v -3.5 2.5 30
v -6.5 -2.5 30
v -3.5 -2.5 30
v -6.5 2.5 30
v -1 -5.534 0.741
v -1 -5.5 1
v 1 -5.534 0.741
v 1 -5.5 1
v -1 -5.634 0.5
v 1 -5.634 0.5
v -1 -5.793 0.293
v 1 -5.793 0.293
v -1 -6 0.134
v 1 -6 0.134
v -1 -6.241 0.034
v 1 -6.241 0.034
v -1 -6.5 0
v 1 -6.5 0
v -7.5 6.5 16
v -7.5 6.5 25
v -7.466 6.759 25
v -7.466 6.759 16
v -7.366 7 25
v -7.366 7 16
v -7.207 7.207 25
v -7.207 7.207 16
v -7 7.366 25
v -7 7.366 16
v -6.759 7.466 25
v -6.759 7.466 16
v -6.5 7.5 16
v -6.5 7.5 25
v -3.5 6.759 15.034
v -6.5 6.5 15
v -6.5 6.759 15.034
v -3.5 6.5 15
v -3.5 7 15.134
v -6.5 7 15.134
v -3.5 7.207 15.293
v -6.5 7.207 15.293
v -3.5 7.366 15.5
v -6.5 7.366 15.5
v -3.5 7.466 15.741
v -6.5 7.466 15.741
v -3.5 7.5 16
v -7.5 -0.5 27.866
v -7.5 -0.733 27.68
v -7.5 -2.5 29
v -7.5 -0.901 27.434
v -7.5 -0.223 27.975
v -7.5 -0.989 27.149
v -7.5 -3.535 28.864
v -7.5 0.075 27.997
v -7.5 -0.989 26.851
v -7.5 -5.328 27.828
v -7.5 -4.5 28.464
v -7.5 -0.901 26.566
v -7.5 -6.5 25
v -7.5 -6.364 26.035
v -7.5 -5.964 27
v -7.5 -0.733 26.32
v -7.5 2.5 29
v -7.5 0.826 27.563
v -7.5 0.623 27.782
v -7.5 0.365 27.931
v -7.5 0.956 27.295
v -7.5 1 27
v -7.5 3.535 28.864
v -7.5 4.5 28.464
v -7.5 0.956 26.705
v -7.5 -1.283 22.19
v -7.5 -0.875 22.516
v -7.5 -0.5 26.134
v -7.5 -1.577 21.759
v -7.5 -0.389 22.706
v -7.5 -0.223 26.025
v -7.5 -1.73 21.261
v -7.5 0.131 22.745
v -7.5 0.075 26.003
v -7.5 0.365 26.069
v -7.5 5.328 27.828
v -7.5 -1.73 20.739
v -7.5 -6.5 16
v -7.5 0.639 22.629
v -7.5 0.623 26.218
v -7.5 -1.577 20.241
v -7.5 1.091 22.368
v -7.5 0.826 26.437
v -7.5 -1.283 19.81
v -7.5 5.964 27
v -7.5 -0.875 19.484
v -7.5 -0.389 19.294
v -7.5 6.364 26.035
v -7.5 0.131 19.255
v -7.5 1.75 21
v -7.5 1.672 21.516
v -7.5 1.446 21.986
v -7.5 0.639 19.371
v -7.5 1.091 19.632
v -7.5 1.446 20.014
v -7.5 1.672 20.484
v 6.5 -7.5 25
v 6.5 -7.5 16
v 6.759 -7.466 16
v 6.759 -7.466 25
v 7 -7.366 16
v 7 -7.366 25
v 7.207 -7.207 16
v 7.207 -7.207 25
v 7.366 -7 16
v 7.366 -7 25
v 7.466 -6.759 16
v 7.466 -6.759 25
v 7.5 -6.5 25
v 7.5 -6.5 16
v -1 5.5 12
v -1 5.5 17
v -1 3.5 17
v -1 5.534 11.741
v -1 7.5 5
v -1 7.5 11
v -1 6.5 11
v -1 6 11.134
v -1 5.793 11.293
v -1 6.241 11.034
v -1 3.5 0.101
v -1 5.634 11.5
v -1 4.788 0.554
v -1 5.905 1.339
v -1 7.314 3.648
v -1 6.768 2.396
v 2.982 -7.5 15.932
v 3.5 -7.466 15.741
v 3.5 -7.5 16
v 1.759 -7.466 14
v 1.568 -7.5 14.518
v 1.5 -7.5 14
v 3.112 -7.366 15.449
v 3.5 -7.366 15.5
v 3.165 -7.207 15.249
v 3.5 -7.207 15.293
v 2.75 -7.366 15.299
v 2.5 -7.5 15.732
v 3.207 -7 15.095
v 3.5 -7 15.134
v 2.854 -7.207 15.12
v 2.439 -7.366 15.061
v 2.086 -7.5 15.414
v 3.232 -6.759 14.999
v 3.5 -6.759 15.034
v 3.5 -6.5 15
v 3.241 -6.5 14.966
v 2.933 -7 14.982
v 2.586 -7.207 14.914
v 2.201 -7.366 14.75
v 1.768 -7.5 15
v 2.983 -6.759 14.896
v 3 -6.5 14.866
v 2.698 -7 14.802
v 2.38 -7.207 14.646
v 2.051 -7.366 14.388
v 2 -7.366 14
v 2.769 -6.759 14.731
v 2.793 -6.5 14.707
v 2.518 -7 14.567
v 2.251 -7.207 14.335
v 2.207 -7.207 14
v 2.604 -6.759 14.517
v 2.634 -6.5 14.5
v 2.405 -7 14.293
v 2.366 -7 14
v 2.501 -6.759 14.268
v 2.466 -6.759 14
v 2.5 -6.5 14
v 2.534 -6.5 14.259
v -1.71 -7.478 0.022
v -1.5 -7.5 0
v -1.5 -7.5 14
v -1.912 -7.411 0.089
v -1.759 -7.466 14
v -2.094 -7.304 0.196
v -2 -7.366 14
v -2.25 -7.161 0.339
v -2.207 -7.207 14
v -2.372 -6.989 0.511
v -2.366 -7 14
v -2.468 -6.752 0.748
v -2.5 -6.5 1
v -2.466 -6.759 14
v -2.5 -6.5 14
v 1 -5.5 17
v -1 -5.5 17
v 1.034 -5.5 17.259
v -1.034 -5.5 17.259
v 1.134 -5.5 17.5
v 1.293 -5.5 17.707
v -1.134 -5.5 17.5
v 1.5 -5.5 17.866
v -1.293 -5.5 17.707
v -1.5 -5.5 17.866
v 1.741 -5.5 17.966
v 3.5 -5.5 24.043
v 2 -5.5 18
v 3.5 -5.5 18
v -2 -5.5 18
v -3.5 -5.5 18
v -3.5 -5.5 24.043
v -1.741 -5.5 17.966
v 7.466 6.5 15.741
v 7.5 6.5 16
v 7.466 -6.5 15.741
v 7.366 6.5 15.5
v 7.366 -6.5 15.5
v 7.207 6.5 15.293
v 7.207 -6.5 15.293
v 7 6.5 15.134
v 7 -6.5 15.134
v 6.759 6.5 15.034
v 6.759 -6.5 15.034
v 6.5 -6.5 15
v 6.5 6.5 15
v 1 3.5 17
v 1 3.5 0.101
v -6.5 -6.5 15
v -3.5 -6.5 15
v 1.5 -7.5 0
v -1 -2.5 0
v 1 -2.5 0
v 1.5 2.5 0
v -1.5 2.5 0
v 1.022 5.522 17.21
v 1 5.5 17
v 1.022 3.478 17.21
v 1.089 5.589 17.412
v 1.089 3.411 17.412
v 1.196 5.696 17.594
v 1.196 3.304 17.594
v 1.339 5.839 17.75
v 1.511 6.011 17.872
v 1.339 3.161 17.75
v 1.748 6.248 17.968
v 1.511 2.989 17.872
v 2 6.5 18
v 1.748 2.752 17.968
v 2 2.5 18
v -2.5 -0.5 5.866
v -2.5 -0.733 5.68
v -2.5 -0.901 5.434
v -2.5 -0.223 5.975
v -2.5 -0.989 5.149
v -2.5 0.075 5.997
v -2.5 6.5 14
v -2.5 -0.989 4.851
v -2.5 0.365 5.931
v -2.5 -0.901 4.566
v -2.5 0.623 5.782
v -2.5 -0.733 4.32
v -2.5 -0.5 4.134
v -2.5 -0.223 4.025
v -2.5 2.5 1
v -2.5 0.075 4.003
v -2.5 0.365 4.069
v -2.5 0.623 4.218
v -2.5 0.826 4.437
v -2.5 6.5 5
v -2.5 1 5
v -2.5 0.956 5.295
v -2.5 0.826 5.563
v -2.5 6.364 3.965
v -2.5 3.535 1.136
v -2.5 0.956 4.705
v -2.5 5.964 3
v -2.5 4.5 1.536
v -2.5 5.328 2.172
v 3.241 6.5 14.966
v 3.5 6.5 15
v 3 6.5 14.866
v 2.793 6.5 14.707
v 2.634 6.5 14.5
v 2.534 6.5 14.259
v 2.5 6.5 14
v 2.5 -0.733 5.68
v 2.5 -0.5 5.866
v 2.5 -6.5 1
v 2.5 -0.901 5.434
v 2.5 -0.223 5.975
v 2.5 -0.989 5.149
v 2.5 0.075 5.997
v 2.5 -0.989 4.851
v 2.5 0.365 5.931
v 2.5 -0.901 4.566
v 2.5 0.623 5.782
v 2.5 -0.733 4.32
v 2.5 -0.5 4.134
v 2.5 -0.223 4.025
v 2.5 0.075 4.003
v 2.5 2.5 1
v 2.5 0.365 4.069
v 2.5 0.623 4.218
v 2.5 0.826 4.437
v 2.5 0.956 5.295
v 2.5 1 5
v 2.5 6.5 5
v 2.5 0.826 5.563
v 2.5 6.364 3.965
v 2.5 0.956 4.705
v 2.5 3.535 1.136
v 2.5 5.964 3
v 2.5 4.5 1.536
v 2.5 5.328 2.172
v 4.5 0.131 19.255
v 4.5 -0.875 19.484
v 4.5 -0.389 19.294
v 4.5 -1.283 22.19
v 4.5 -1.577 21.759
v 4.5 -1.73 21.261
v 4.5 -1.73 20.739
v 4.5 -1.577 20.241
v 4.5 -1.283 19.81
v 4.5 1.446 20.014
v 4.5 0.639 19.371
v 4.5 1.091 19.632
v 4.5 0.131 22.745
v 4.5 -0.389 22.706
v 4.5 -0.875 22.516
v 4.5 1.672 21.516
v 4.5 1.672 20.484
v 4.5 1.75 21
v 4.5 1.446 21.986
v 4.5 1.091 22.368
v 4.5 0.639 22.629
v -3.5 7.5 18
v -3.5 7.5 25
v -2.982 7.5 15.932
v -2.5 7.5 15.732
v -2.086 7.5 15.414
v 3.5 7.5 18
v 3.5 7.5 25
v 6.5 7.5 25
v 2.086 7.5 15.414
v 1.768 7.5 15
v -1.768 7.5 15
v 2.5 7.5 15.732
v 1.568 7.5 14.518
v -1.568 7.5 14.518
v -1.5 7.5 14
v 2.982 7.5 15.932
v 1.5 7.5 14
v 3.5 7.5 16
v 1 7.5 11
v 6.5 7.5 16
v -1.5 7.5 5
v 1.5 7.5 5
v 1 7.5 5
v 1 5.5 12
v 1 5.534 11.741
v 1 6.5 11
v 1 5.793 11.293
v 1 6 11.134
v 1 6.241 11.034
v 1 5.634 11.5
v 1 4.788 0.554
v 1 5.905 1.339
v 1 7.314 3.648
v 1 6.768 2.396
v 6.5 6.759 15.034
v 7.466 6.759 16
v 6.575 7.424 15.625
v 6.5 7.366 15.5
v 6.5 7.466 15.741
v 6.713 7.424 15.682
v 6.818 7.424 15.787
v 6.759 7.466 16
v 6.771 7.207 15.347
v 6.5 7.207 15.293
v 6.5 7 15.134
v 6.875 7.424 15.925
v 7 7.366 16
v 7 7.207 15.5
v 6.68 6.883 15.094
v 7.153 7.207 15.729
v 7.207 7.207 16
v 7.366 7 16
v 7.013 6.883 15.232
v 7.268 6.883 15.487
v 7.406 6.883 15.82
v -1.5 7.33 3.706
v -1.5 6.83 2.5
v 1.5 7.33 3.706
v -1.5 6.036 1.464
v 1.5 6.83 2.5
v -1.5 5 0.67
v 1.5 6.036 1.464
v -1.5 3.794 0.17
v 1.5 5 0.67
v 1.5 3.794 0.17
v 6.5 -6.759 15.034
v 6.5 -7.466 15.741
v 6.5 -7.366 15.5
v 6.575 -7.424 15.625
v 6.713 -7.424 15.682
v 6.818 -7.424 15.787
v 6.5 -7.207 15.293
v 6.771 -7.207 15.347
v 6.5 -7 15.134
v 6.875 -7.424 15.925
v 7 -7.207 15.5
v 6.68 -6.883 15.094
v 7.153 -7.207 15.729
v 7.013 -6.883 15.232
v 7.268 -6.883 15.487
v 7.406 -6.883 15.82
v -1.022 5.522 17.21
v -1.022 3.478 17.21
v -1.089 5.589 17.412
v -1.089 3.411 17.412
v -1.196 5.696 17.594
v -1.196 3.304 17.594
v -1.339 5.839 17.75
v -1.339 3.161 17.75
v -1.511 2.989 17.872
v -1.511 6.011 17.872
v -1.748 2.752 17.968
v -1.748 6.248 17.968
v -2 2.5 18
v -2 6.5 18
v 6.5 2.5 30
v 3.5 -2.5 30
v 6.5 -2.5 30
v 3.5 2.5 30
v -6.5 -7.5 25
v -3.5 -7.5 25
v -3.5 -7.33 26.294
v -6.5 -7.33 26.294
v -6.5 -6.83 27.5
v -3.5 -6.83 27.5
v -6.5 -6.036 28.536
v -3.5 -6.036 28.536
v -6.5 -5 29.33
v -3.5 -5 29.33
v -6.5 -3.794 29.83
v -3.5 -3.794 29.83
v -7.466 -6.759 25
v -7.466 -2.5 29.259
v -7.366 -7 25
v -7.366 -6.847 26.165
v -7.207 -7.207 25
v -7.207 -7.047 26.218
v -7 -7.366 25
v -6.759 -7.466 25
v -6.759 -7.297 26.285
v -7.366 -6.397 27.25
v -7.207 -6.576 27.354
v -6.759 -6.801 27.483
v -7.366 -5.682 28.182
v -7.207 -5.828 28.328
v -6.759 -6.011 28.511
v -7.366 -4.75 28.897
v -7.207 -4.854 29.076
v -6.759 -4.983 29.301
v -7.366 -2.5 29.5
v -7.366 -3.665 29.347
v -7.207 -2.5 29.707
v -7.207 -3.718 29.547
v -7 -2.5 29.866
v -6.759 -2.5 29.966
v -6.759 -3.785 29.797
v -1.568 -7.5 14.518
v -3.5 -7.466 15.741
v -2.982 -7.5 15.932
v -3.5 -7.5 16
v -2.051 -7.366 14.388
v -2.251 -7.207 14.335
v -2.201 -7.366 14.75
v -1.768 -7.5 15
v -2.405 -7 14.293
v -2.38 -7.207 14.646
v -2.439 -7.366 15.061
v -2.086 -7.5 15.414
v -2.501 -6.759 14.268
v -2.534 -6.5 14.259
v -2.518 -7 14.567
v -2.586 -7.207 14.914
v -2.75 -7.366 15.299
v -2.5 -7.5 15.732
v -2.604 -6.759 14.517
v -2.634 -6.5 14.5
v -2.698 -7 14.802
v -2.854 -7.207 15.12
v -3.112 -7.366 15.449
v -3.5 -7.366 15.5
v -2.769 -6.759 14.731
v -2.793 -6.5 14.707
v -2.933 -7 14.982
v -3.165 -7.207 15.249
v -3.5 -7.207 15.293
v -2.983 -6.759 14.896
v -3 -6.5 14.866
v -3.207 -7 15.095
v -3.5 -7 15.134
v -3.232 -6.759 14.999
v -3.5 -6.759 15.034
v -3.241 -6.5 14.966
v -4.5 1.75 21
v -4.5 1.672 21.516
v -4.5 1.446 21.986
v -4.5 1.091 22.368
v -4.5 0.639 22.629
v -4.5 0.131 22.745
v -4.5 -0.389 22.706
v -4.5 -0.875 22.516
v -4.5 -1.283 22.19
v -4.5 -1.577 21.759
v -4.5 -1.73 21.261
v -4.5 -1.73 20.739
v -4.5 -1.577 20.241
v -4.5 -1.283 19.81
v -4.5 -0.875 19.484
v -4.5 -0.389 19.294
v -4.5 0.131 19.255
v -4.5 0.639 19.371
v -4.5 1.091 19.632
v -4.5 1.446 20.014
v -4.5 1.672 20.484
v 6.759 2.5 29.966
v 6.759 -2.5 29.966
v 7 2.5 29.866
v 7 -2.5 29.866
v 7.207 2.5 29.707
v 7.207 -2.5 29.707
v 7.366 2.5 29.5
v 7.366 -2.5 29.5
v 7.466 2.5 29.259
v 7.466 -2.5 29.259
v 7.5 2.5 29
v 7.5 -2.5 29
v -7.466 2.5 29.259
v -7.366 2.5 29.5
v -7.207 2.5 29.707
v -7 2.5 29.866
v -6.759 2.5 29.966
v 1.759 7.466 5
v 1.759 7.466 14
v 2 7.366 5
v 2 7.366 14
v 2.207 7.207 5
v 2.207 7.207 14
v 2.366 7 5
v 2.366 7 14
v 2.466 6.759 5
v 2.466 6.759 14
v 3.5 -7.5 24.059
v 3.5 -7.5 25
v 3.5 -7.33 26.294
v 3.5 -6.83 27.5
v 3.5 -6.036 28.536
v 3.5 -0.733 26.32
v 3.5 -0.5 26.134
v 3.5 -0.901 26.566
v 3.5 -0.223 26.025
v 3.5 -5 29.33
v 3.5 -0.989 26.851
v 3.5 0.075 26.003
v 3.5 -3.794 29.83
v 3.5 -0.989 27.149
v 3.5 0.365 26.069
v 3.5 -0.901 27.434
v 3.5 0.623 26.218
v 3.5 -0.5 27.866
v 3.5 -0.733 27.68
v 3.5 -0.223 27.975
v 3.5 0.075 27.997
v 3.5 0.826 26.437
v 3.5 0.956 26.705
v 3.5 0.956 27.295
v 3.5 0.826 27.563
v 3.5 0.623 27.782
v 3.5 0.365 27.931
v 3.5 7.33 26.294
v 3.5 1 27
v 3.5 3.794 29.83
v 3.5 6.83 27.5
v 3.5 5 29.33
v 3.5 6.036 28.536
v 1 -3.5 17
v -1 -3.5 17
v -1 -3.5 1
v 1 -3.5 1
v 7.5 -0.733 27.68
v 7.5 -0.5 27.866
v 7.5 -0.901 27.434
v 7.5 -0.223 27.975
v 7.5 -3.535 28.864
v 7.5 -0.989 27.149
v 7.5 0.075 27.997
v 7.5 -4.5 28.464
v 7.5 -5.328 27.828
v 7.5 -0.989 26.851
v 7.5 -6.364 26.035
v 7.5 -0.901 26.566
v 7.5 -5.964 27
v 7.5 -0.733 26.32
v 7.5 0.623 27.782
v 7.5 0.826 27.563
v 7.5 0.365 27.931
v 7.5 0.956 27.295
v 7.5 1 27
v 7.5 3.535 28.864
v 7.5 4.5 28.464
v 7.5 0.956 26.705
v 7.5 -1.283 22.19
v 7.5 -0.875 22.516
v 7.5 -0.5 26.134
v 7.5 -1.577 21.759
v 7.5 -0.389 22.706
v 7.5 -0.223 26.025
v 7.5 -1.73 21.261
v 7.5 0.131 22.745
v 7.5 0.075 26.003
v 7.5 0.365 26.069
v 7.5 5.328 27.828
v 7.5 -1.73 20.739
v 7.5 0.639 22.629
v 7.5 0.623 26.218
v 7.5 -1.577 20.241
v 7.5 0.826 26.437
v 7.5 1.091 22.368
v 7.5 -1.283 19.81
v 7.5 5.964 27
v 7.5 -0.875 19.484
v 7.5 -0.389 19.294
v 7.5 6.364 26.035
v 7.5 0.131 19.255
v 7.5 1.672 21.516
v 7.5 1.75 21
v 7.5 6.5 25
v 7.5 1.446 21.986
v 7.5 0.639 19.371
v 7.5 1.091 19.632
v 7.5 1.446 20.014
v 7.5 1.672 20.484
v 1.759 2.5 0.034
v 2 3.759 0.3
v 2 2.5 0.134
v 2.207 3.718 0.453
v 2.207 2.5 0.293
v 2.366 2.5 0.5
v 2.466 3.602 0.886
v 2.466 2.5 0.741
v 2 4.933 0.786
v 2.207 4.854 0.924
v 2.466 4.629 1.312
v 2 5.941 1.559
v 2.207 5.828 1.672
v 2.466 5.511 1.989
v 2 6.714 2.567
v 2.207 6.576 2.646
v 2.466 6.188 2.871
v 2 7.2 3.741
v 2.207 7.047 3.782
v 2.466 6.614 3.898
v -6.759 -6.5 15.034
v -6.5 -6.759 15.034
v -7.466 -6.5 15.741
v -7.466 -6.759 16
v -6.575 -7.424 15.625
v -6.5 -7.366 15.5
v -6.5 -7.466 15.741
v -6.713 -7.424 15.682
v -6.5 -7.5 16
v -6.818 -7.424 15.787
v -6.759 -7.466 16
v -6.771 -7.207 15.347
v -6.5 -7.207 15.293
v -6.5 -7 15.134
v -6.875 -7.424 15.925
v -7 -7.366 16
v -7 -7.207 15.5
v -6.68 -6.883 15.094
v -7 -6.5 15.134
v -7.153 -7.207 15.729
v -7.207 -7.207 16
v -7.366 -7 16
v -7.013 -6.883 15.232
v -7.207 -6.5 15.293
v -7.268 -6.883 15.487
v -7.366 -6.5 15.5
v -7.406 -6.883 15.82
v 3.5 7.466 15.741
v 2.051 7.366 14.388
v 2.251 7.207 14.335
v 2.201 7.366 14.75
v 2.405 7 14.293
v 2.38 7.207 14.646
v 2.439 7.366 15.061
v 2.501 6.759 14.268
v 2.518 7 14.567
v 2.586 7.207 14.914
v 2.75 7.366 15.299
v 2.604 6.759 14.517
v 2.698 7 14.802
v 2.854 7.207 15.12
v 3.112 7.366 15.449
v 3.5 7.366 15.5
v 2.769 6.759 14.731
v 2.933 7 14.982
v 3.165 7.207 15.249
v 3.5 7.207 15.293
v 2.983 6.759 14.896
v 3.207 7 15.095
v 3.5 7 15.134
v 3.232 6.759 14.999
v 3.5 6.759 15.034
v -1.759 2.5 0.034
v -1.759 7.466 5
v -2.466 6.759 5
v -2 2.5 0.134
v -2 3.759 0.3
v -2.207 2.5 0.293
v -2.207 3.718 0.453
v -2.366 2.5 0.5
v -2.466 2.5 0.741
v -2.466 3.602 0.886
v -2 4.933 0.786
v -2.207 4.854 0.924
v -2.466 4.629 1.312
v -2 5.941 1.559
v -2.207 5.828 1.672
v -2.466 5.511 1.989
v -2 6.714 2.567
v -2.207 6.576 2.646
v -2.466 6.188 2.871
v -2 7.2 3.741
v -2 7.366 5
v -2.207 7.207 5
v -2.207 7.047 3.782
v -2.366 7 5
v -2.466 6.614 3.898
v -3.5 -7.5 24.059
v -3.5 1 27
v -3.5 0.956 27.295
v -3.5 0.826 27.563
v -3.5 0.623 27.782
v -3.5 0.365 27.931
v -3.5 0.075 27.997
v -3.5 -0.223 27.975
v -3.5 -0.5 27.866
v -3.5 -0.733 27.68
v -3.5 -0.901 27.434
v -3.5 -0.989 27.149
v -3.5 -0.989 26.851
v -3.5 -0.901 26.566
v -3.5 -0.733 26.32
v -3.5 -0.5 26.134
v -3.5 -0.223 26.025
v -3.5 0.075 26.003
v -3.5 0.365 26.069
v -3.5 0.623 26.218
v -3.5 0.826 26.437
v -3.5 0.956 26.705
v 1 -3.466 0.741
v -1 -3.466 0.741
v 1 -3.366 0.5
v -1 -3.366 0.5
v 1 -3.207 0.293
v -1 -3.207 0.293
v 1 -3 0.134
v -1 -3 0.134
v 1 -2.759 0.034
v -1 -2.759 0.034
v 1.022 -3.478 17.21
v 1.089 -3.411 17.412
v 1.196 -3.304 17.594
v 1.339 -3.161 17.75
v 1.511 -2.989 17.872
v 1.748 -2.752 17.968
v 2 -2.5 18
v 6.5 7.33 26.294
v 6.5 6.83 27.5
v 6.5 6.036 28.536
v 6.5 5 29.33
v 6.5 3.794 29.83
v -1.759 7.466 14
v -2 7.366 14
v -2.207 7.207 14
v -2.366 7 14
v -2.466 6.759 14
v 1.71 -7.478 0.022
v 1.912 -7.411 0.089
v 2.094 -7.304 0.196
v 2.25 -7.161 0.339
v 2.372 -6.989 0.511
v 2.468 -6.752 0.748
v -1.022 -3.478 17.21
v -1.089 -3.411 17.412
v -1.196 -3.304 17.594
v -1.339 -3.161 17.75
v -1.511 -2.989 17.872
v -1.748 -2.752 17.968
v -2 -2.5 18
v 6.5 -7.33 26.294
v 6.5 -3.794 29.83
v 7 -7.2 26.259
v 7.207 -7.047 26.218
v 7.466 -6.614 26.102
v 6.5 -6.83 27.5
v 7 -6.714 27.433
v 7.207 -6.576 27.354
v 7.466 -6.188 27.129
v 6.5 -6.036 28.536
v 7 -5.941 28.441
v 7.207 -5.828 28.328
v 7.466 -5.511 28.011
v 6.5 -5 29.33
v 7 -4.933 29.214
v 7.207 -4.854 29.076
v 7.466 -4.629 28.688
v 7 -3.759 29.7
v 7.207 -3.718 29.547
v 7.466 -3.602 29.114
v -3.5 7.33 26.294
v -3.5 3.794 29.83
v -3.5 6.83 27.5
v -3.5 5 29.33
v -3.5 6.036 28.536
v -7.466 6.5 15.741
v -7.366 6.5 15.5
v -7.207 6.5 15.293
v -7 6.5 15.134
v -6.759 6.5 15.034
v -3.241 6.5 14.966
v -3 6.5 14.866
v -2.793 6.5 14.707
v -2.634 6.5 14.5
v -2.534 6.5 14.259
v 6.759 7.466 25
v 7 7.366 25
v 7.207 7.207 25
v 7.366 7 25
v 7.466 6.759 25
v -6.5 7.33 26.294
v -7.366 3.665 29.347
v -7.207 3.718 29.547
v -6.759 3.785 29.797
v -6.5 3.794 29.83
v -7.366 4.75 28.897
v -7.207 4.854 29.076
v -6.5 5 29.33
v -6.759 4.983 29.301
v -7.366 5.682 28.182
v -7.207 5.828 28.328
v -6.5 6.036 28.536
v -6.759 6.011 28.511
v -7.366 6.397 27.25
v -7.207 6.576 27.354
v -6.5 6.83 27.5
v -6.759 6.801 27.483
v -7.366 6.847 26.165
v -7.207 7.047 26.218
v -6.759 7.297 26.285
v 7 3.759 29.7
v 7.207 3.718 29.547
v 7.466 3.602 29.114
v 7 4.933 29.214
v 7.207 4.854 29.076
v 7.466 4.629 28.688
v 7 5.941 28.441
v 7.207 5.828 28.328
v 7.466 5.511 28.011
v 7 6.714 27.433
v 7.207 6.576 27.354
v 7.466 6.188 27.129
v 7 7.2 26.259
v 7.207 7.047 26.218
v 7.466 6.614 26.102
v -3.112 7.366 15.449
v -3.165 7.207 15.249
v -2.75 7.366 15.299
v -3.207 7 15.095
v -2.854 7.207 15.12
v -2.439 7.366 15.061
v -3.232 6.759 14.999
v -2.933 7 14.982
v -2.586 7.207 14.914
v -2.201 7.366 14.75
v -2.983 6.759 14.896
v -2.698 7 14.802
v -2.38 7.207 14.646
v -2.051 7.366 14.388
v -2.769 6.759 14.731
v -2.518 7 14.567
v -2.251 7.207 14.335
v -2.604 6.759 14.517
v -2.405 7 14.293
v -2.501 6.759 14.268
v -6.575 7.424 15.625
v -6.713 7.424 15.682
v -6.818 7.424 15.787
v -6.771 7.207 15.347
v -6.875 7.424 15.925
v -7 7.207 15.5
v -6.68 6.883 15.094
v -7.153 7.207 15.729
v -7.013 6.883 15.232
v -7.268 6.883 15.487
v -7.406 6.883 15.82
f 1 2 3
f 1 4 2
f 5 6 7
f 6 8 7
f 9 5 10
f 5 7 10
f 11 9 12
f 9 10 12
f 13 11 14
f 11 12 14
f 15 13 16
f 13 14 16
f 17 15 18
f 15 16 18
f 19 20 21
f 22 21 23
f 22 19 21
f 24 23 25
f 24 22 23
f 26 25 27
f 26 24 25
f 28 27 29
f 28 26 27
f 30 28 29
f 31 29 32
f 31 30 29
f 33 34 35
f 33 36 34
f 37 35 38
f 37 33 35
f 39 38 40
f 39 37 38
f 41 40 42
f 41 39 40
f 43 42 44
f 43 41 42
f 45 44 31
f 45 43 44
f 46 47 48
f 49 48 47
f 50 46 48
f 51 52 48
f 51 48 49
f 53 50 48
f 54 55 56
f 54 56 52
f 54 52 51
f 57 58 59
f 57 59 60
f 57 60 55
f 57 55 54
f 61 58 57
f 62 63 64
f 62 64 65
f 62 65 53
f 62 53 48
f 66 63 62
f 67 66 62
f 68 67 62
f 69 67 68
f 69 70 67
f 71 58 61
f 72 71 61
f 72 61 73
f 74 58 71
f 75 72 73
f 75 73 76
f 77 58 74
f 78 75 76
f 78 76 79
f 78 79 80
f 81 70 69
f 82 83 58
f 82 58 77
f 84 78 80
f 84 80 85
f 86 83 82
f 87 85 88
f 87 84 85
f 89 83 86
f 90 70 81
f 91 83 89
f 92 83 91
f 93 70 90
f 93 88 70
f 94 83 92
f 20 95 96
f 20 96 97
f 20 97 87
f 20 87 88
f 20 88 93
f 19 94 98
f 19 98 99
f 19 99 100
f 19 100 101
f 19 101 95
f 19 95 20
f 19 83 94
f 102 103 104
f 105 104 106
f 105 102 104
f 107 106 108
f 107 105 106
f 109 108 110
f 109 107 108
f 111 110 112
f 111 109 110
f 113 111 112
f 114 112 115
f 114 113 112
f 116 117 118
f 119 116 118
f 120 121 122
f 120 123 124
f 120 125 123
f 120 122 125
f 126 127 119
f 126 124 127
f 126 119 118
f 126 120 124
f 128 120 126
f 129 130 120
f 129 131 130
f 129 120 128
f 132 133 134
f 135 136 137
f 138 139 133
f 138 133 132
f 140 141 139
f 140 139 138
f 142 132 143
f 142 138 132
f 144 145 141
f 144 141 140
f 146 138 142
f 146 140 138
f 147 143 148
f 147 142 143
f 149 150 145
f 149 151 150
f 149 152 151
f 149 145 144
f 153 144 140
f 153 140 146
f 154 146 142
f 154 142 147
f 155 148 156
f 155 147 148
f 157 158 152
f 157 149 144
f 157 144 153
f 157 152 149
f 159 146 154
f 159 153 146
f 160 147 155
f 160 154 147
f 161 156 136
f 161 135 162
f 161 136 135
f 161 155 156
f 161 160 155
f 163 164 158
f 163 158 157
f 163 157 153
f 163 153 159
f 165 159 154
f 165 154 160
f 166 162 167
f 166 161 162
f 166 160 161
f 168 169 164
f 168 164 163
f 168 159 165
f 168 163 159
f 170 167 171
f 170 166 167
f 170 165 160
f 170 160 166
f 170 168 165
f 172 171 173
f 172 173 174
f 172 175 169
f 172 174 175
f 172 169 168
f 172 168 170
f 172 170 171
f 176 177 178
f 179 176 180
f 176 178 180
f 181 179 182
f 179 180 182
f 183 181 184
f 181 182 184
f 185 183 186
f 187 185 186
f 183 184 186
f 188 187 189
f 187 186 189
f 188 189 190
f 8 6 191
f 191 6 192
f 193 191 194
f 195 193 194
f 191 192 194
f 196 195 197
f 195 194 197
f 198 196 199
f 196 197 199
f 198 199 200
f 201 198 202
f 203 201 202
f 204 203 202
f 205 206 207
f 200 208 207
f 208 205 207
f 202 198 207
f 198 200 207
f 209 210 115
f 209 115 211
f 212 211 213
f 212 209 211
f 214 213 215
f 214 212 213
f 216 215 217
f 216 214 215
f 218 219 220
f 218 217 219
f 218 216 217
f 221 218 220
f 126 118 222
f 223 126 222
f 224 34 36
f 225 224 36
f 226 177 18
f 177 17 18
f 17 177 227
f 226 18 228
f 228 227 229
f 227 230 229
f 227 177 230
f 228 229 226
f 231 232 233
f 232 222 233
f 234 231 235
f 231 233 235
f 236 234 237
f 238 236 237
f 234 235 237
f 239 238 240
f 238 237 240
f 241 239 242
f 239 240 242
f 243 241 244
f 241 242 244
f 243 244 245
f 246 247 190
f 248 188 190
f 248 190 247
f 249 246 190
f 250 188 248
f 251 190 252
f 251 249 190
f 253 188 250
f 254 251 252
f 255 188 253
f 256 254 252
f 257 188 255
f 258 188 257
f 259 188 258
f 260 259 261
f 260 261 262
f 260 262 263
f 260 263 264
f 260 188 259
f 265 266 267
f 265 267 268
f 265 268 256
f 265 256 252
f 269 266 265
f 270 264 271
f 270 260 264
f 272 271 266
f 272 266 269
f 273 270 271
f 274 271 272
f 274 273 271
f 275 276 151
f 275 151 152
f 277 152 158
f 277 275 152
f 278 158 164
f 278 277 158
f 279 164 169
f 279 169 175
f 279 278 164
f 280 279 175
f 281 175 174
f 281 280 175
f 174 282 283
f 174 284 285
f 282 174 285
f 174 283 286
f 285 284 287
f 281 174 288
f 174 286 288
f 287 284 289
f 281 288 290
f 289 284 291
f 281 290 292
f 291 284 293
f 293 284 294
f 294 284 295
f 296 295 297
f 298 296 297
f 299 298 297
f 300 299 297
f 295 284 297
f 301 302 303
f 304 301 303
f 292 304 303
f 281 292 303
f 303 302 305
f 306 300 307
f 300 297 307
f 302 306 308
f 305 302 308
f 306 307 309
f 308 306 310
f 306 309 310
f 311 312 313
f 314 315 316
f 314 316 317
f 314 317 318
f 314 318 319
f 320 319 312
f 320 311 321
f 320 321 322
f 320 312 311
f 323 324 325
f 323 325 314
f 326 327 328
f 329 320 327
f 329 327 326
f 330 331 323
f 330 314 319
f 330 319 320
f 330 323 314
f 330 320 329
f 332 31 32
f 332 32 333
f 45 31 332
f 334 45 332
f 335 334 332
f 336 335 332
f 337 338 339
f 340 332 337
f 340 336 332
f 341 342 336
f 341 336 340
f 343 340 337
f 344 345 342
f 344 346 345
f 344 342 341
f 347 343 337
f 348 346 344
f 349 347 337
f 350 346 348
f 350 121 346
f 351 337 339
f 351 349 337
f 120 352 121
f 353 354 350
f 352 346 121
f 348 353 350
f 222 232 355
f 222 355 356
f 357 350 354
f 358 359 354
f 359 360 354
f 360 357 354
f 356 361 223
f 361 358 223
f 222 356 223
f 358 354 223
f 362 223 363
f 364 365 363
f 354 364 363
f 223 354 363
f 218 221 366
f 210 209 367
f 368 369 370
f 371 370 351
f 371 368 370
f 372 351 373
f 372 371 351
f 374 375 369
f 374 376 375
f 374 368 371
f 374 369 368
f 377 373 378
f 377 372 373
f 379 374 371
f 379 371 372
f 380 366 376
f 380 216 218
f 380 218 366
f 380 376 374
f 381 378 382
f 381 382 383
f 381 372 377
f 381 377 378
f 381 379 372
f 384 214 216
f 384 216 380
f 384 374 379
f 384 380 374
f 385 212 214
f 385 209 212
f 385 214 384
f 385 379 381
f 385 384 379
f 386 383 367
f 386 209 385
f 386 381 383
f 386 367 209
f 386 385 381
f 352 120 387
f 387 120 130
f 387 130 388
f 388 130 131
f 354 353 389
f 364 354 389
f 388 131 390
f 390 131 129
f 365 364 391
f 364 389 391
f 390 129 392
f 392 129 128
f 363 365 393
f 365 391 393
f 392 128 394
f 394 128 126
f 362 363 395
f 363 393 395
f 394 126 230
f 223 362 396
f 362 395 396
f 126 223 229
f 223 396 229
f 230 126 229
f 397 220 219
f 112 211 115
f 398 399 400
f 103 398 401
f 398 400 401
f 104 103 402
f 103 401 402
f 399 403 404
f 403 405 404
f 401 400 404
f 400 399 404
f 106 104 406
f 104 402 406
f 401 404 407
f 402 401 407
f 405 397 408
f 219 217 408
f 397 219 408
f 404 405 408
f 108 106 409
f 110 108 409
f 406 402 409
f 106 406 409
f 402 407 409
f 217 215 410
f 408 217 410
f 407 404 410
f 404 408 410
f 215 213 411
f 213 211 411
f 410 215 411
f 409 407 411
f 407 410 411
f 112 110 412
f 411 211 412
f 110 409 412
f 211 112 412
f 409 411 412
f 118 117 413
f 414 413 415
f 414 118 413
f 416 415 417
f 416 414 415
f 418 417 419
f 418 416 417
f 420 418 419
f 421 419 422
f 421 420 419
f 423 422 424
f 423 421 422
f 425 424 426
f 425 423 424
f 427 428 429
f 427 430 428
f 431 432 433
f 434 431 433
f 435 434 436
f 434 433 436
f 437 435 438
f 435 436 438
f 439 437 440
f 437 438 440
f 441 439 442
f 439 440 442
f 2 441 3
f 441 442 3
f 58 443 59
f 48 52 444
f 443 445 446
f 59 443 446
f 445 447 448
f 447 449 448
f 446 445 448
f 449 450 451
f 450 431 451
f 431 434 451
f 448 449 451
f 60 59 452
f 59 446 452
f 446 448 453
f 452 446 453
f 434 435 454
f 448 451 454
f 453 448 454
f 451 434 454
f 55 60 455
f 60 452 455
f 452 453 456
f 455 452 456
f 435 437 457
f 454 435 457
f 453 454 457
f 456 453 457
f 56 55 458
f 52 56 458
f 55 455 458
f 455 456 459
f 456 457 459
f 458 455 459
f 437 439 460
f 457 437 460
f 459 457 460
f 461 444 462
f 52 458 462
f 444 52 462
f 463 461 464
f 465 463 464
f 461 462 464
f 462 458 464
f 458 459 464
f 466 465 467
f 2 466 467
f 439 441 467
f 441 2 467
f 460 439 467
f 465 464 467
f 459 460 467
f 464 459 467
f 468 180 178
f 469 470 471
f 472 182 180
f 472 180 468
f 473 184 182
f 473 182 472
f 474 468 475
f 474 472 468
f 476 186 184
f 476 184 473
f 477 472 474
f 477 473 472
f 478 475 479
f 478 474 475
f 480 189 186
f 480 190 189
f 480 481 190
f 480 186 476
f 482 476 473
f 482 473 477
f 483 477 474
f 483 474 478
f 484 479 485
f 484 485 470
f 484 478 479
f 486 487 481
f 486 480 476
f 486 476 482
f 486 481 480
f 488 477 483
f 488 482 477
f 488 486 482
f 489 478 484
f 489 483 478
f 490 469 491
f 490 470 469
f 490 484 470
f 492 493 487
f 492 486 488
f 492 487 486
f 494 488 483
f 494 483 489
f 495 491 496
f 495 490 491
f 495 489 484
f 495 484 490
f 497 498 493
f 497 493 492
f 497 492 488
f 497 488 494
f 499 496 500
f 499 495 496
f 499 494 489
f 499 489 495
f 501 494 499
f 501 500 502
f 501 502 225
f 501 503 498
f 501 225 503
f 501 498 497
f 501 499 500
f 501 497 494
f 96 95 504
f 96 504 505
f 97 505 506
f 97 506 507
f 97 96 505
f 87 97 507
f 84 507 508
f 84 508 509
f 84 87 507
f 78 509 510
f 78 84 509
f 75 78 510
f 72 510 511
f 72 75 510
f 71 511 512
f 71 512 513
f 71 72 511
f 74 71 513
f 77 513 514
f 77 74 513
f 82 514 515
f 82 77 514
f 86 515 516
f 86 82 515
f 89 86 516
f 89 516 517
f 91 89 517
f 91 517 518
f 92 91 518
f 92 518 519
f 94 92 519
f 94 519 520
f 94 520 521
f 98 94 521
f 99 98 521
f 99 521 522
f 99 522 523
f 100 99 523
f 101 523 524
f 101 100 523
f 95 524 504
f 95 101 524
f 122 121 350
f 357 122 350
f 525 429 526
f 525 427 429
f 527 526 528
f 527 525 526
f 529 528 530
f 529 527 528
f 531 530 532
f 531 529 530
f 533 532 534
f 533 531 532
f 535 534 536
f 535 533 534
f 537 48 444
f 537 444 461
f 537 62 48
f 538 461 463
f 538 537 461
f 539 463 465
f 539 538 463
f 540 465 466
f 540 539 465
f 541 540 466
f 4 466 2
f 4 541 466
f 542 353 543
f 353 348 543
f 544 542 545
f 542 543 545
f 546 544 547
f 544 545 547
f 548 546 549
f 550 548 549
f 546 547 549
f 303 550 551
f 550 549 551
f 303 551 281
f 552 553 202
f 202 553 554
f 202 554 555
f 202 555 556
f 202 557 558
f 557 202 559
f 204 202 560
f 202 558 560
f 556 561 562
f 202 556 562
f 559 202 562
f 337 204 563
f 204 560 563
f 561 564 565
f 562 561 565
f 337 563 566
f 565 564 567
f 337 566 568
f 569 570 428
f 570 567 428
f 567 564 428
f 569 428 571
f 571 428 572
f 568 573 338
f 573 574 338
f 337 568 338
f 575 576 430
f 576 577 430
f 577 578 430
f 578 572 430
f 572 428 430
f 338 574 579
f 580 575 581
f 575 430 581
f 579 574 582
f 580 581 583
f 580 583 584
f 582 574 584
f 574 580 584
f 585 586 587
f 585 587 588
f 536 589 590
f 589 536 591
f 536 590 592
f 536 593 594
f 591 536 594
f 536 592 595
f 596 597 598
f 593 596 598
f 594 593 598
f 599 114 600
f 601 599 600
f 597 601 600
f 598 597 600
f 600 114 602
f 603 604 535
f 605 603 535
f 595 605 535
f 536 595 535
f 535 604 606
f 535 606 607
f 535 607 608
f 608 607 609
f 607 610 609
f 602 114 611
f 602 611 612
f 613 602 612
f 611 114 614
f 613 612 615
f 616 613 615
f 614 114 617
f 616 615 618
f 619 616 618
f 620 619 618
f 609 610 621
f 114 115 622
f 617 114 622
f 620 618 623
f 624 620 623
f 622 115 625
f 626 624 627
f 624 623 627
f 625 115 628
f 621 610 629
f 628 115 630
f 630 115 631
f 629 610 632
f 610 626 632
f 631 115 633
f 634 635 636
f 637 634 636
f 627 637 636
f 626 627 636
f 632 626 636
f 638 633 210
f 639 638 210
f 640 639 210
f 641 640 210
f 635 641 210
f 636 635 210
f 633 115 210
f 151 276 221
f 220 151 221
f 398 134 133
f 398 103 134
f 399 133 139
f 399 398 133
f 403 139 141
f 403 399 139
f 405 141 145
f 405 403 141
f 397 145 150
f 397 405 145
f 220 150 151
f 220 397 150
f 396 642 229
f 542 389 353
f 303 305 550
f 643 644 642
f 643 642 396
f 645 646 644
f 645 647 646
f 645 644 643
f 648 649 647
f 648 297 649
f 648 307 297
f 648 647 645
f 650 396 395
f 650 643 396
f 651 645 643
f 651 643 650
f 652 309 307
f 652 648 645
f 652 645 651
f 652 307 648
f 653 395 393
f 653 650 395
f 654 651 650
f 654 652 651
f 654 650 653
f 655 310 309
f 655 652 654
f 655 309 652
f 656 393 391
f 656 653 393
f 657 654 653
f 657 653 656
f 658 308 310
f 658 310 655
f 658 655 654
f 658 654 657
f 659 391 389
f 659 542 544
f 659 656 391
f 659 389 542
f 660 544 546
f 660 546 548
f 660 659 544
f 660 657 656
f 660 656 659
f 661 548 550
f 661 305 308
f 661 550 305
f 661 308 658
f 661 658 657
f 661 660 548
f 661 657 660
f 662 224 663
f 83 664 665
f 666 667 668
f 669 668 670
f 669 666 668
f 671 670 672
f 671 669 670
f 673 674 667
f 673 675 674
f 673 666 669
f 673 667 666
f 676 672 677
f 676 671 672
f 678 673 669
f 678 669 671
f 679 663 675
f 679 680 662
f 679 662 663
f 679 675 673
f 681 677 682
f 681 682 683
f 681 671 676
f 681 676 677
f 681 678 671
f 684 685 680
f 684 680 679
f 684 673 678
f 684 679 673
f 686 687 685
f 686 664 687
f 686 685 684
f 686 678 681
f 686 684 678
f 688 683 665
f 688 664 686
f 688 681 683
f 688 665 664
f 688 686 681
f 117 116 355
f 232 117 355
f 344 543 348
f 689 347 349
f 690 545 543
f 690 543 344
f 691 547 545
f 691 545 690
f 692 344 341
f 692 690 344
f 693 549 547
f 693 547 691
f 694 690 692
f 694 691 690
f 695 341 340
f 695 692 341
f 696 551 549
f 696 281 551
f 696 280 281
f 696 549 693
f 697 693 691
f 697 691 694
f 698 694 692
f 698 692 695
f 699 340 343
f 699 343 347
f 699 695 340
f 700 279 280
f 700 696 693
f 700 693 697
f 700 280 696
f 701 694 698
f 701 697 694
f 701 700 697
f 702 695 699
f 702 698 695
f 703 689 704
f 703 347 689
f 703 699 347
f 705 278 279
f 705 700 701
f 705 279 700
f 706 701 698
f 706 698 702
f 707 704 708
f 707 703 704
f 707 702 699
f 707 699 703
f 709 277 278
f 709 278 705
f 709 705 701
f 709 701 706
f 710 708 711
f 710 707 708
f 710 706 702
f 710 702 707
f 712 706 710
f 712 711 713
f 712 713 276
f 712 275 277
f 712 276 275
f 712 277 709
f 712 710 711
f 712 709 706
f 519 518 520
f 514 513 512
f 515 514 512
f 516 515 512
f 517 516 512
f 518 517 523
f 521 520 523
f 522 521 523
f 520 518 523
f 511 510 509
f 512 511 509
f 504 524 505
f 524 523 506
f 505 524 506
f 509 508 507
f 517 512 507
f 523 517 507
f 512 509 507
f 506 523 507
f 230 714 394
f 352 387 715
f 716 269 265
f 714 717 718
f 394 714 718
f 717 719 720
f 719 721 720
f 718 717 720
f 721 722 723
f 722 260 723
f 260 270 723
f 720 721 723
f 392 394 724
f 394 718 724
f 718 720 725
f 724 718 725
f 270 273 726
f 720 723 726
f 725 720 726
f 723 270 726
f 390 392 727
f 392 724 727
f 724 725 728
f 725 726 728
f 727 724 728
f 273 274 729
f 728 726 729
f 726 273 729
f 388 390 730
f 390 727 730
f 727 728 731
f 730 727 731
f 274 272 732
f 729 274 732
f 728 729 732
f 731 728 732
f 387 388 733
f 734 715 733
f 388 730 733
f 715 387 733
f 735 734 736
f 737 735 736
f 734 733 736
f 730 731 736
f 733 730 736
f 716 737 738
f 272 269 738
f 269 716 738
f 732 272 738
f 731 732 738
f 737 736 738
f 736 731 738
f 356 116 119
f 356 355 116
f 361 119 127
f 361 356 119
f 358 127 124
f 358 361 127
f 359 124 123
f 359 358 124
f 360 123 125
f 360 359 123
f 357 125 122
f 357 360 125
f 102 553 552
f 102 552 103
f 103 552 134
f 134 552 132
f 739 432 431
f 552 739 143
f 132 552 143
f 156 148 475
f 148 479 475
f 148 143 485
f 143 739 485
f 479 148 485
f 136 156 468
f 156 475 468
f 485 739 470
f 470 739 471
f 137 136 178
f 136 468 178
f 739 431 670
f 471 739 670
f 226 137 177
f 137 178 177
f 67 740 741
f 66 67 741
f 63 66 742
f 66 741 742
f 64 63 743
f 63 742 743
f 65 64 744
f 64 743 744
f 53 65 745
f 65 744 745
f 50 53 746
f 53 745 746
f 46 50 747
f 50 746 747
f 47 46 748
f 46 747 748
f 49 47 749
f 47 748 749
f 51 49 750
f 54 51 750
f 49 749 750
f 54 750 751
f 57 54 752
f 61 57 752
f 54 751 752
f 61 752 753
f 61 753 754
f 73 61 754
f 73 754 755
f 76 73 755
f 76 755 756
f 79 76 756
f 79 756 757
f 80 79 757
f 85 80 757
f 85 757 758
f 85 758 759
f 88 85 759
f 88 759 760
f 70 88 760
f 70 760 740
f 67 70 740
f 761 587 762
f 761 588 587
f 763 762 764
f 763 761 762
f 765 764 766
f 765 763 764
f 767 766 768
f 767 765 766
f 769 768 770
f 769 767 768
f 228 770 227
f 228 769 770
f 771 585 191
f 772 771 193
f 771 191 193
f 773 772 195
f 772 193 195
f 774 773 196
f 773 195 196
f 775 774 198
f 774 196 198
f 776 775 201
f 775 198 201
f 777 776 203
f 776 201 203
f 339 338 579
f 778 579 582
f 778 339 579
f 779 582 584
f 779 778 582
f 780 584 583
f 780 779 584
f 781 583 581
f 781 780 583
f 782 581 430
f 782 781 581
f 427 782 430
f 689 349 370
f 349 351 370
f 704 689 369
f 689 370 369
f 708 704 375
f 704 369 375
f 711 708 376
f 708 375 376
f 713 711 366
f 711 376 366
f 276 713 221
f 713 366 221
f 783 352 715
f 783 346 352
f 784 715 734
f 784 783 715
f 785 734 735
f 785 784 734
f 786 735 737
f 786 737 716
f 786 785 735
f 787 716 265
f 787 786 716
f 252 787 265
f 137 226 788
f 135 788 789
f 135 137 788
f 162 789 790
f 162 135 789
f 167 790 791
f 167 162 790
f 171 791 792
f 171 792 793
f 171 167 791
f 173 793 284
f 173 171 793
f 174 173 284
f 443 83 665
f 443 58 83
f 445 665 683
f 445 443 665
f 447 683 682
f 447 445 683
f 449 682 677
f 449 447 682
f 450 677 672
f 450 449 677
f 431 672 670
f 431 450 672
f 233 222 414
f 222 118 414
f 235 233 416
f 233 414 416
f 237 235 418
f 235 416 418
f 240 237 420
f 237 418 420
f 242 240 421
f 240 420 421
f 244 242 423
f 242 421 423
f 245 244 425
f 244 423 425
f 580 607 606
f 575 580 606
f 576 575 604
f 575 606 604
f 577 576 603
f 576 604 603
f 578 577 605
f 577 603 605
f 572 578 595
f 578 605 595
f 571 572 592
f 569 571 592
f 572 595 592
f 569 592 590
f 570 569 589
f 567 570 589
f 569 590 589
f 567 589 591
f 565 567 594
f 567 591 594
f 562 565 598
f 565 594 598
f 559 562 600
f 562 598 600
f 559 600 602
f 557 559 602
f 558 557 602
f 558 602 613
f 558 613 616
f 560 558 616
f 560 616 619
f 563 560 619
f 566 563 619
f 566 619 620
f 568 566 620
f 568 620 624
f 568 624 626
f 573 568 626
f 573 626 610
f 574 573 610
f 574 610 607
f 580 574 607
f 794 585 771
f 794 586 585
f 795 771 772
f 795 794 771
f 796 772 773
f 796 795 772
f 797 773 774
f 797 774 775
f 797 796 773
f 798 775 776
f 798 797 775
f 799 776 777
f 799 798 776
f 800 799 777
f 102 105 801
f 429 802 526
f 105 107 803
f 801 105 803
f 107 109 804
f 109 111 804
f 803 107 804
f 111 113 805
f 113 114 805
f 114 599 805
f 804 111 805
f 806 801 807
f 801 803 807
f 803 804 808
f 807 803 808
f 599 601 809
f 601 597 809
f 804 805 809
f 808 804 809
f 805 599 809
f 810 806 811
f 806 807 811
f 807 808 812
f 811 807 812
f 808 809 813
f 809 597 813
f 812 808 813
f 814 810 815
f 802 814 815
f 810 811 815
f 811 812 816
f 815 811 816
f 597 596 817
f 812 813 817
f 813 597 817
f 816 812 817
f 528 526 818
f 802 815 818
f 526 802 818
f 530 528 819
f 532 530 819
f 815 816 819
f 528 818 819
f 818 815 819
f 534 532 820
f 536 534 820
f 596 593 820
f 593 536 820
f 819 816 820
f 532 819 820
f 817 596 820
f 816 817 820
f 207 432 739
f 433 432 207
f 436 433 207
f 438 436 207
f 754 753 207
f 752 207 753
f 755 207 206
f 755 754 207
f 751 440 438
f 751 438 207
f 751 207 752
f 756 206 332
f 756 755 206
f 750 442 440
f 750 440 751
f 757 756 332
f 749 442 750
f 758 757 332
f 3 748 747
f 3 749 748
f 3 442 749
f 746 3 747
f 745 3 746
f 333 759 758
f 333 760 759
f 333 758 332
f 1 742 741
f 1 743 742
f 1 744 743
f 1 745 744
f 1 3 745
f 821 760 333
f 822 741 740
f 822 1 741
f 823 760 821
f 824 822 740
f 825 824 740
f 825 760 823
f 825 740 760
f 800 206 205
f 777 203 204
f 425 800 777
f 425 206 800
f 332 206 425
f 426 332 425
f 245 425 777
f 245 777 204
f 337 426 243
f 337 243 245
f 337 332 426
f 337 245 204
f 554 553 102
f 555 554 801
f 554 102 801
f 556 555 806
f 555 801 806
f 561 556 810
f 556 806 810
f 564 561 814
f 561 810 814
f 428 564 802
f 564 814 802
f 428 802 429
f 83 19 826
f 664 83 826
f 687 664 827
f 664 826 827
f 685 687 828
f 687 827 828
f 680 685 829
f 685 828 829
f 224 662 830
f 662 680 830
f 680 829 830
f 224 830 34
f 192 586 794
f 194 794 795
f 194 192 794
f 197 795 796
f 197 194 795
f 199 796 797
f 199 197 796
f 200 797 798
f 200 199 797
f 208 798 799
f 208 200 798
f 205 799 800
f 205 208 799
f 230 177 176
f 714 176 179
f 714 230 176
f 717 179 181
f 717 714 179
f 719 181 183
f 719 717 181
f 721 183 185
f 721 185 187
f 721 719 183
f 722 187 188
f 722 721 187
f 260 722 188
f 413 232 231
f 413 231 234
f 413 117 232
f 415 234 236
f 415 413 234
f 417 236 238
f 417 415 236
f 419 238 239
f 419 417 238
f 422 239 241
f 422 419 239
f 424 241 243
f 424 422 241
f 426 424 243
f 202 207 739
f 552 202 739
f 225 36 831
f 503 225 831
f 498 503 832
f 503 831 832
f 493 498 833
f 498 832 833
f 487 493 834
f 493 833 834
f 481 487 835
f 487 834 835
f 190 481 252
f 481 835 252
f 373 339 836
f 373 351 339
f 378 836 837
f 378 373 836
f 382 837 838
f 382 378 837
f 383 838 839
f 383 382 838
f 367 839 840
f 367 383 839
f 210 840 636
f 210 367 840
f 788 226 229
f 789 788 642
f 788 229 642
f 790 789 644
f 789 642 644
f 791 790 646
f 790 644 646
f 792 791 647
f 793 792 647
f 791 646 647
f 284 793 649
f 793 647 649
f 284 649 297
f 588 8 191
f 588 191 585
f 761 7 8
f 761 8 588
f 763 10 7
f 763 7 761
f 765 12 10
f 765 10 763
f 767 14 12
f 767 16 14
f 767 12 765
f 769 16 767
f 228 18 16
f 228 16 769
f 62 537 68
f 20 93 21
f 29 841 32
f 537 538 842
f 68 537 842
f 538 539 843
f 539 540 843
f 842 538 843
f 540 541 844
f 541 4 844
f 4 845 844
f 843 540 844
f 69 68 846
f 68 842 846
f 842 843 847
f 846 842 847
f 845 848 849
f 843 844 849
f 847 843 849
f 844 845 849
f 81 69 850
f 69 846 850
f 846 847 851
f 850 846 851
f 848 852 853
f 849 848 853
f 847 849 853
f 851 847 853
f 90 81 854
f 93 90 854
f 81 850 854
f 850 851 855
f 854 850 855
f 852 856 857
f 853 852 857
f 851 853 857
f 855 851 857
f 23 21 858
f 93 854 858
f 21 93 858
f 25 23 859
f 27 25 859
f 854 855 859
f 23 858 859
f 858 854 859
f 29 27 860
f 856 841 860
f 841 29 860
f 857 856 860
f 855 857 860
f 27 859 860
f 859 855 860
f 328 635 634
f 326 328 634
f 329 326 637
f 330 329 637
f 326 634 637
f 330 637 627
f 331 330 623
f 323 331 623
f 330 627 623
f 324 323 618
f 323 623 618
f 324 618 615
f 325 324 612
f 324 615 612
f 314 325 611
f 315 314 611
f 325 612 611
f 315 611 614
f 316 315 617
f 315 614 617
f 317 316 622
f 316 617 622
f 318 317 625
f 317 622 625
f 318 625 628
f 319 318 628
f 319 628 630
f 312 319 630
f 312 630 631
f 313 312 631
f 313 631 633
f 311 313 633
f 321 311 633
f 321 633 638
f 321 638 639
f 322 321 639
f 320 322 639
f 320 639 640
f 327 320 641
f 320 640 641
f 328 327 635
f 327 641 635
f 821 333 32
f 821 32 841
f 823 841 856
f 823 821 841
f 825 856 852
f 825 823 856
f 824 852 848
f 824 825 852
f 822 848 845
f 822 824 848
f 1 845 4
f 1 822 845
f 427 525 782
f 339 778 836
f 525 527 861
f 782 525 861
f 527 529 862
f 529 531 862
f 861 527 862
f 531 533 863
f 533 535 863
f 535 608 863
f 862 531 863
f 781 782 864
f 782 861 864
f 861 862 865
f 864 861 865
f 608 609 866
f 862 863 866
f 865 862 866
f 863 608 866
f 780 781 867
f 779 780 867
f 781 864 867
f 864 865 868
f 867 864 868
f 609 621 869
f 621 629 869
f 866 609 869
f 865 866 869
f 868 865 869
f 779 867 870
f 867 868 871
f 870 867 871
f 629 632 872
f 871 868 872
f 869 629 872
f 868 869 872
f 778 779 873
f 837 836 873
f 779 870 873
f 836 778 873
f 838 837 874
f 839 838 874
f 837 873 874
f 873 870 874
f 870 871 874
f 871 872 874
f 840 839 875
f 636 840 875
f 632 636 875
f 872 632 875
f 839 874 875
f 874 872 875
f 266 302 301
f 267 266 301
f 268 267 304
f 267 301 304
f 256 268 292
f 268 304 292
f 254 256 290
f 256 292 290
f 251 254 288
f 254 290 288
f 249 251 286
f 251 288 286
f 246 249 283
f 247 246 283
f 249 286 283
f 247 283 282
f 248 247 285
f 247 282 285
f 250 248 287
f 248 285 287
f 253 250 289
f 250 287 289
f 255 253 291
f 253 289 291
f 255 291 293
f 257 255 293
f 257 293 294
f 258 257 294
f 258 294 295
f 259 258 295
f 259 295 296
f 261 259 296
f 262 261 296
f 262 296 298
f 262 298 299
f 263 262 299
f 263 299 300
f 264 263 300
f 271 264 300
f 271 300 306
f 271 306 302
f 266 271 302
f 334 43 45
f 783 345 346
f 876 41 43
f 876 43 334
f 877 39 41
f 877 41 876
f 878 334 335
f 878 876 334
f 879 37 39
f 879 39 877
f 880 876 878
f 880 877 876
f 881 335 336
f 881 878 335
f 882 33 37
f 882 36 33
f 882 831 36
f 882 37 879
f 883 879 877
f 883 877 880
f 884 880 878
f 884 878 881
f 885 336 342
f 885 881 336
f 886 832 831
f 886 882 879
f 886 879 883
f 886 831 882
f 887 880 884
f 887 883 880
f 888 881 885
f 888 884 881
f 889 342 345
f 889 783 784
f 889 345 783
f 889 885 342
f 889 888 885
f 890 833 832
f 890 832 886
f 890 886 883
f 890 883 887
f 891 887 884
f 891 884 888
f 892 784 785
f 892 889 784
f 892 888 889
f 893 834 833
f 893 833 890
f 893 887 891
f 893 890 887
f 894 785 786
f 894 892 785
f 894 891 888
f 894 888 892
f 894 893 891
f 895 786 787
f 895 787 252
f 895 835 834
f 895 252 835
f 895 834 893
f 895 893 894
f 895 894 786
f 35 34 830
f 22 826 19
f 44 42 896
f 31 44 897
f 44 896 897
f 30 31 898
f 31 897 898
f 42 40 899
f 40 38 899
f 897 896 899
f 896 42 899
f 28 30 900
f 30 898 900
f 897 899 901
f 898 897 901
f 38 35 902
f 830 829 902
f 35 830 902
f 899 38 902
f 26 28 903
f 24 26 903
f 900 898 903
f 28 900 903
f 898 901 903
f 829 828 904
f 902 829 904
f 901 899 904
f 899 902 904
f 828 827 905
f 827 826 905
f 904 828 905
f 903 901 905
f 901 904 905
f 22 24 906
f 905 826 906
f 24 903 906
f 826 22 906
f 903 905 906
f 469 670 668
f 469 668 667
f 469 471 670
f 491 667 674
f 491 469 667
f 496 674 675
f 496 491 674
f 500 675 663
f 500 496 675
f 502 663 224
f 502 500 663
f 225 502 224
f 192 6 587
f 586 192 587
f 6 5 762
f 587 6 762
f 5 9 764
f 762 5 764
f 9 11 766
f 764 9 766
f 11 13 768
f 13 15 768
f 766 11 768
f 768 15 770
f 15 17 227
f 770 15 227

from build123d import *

# Parameters (mm, degrees)
BASE_SKETCH_W                        = 15
BASE_SKETCH_H                        = 15
BASE_SKETCH_EXTRUDE_DEPTH            = 30
CENTER_NUB_CUTOUT_SKETCH_W           = 5
CENTER_NUB_CUTOUT_SKETCH_H           = 15
HINGE_NUB_EXTRUDED_CUT_DEPTH         = 15
HINGE_CUTOUT_SKETCH_W                = 7
HINGE_CUTOUT_SKETCH_H                = 15
HINGE_CUTOUT_EXTRUDED_CUT_DEPTH      = 12
HINGE_HOLE_SKETCH_R                  = 1
HINGE_HOLE_EXTRUDED_CUT_DEPTH        = 35.369317712
CORNER_FILLETS_R                     = 5
STYLE_FILLETS_R                      = 1
ROUTING_HOLES_SKETCH_W               = 2
ROUTING_HOLES_SKETCH_H               = 2
ROUTING_HOLES_EXTRUDED_CUT_DEPTH     = 32.819805153
BACKING_START                        = -3.5
BACKING_EXTRUDE_DEPTH                = 7
EXTRA_ROUTING_CUT_SKETCH_W           = 2
EXTRA_ROUTING_CUT_SKETCH_H           = 10
EXTRA_ROUTING_EXTRUDED_CUT_DEPTH     = 4
ROUTING_FILLETS_R                    = 1
SKETCH2_R                            = 1.75
MIDDLE_SECTION_CONNECTION_HOLE_DEPTH = 3


# Read off the part's stored shape, not the designer's step: Backing Extrude
with BuildPart() as part:
    # Base Sketch → Base Sketch Extrude (new body)
    with BuildSketch(Plane.XY):
        Rectangle(BASE_SKETCH_W, BASE_SKETCH_H)
    extrude(amount=BASE_SKETCH_EXTRUDE_DEPTH)

    # Center Nub Cutout Sketch → Hinge Nub Extruded Cut (cut)
    with BuildSketch(Plane.XY):
        with Locations((5, 0)):
            Rectangle(CENTER_NUB_CUTOUT_SKETCH_W, CENTER_NUB_CUTOUT_SKETCH_H)
        with Locations((-5, 0)):
            Rectangle(CENTER_NUB_CUTOUT_SKETCH_W, CENTER_NUB_CUTOUT_SKETCH_H)
    extrude(amount=HINGE_NUB_EXTRUDED_CUT_DEPTH, mode=Mode.SUBTRACT)

    # Hinge Cutout Sketch → Hinge Cutout Extruded Cut (cut)
    with BuildSketch(Plane.XY.offset(30)):
        Rectangle(HINGE_CUTOUT_SKETCH_W, HINGE_CUTOUT_SKETCH_H)
    extrude(amount=-HINGE_CUTOUT_EXTRUDED_CUT_DEPTH, mode=Mode.SUBTRACT)

    # Hinge Hole Sketch → Hinge Hole Extruded Cut (cut, through all)
    with BuildSketch(Plane(origin=(7.5, 0, 0), x_dir=(0, 0, -1), z_dir=(1, 0, 0))):
        with Locations(Location((-5, 0, 0), (0, 0, 90))):
            Circle(HINGE_HOLE_SKETCH_R)
        with Locations(Location((-27, 0, 0), (0, 0, 90))):
            Circle(HINGE_HOLE_SKETCH_R)
    extrude(amount=-HINGE_HOLE_EXTRUDED_CUT_DEPTH, mode=Mode.SUBTRACT)

    # Corner Fillets
    corner_fillets_edges = [part.edges().sort_by_distance(p)[0] for p in [
        (0, 7.5, 0),
        (-5.5, -7.5, 30),
        (-5.5, 7.5, 30),
        (5.5, -7.5, 30),
        (5.5, 7.5, 30),
    ]]
    fillet(corner_fillets_edges, radius=CORNER_FILLETS_R)

    # Style Fillets
    style_fillets_edges = [part.edges().sort_by_distance(p)[0] for p in [
        (2.5, 7.5, 10),
        (2.5, -7.5, 7.5),
        (7.5, 0, 15),
        (5, 7.5, 15),
        (2.5, 0, 15),
        (5, -7.5, 15),
        (-2.5, -2.5, 0),
        (-2.5, -7.5, 7.5),
        (-2.5, 7.5, 10),
        (-7.5, 0, 15),
        (-5, -7.5, 15),
        (-2.5, 0, 15),
        (-5, 7.5, 15),
        (-7.5, 0, 30),
        (-7.5, -7.5, 20),
        (7.5, -7.5, 20),
        (-7.5, 7.5, 20),
        (-7.5, 6.035533906, 28.535533906),
        (-7.5, -6.035533906, 28.535533906),
        (7.5, 7.5, 20),
        (7.5, 0, 30),
        (7.5, 6.035533906, 28.535533906),
        (7.5, -6.035533906, 28.535533906),
        (-2.5, 6.035533906, 1.464466094),
        (2.5, -2.5, 0),
        (2.5, 6.035533906, 1.464466094),
    ]]
    fillet(style_fillets_edges, radius=STYLE_FILLETS_R)

    # Routing Holes Sketch → Routing Holes Extruded Cut (cut, through all)
    with BuildSketch(Plane.XY):
        with Locations((0, 4.5)):
            Rectangle(ROUTING_HOLES_SKETCH_W, ROUTING_HOLES_SKETCH_H)
        with Locations((0, -4.5)):
            Rectangle(ROUTING_HOLES_SKETCH_W, ROUTING_HOLES_SKETCH_H)
    extrude(amount=ROUTING_HOLES_EXTRUDED_CUT_DEPTH, mode=Mode.SUBTRACT)

    # Backing Extrude outline → Backing Extrude (add)
    with BuildSketch(Plane.YZ.offset(BACKING_START)):
        Polygon((-7.5, 24.05884149), (-7.5, 18), (-5.5, 18), (-5.5, 24.043125728), align=None)
    extrude(amount=BACKING_EXTRUDE_DEPTH)

    # Extra Routing Cut Sketch → Extra Routing Extruded Cut (cut)
    with BuildSketch(Plane(origin=(0, 7.5, 0), x_dir=(1, 0, 0), z_dir=(0, 1, 0))):
        with Locations((0, -6)):
            Rectangle(EXTRA_ROUTING_CUT_SKETCH_W, EXTRA_ROUTING_CUT_SKETCH_H)
    extrude(amount=-EXTRA_ROUTING_EXTRUDED_CUT_DEPTH, mode=Mode.SUBTRACT)

    # Routing Fillets
    routing_fillets_edges = [part.edges().sort_by_distance(p)[0] for p in [
        (-1, -4.5, 18),
        (0, -3.5, 18),
        (1, -4.5, 18),
        (-1, 4.5, 18),
        (0, 3.5, 18),
        (1, 4.5, 18),
        (0, 5.5, 18),
        (0, -5.5, 0),
        (0, -3.5, 0),
        (0, 5.5, 11),
    ]]
    fillet(routing_fillets_edges, radius=ROUTING_FILLETS_R)

    # Sketch2 → Middle Section Connection Hole (cut)
    with BuildSketch(Plane(origin=(7.5, 0, 0), x_dir=(0, 0, -1), z_dir=(1, 0, 0))):
        with Locations(Location((-21, 0, 0), (0, 0, 90))):
            Circle(SKETCH2_R)
    middle_section_connection_hole = extrude(amount=-MIDDLE_SECTION_CONNECTION_HOLE_DEPTH, mode=Mode.SUBTRACT)

    # Mirror1: Middle Section Connection Hole across plane
    add(middle_section_connection_hole.mirror(Plane(origin=(0, 0, 0), x_dir=(0, 0, 1), z_dir=(1, 0, 0))), mode=Mode.SUBTRACT)


solid = part.part
